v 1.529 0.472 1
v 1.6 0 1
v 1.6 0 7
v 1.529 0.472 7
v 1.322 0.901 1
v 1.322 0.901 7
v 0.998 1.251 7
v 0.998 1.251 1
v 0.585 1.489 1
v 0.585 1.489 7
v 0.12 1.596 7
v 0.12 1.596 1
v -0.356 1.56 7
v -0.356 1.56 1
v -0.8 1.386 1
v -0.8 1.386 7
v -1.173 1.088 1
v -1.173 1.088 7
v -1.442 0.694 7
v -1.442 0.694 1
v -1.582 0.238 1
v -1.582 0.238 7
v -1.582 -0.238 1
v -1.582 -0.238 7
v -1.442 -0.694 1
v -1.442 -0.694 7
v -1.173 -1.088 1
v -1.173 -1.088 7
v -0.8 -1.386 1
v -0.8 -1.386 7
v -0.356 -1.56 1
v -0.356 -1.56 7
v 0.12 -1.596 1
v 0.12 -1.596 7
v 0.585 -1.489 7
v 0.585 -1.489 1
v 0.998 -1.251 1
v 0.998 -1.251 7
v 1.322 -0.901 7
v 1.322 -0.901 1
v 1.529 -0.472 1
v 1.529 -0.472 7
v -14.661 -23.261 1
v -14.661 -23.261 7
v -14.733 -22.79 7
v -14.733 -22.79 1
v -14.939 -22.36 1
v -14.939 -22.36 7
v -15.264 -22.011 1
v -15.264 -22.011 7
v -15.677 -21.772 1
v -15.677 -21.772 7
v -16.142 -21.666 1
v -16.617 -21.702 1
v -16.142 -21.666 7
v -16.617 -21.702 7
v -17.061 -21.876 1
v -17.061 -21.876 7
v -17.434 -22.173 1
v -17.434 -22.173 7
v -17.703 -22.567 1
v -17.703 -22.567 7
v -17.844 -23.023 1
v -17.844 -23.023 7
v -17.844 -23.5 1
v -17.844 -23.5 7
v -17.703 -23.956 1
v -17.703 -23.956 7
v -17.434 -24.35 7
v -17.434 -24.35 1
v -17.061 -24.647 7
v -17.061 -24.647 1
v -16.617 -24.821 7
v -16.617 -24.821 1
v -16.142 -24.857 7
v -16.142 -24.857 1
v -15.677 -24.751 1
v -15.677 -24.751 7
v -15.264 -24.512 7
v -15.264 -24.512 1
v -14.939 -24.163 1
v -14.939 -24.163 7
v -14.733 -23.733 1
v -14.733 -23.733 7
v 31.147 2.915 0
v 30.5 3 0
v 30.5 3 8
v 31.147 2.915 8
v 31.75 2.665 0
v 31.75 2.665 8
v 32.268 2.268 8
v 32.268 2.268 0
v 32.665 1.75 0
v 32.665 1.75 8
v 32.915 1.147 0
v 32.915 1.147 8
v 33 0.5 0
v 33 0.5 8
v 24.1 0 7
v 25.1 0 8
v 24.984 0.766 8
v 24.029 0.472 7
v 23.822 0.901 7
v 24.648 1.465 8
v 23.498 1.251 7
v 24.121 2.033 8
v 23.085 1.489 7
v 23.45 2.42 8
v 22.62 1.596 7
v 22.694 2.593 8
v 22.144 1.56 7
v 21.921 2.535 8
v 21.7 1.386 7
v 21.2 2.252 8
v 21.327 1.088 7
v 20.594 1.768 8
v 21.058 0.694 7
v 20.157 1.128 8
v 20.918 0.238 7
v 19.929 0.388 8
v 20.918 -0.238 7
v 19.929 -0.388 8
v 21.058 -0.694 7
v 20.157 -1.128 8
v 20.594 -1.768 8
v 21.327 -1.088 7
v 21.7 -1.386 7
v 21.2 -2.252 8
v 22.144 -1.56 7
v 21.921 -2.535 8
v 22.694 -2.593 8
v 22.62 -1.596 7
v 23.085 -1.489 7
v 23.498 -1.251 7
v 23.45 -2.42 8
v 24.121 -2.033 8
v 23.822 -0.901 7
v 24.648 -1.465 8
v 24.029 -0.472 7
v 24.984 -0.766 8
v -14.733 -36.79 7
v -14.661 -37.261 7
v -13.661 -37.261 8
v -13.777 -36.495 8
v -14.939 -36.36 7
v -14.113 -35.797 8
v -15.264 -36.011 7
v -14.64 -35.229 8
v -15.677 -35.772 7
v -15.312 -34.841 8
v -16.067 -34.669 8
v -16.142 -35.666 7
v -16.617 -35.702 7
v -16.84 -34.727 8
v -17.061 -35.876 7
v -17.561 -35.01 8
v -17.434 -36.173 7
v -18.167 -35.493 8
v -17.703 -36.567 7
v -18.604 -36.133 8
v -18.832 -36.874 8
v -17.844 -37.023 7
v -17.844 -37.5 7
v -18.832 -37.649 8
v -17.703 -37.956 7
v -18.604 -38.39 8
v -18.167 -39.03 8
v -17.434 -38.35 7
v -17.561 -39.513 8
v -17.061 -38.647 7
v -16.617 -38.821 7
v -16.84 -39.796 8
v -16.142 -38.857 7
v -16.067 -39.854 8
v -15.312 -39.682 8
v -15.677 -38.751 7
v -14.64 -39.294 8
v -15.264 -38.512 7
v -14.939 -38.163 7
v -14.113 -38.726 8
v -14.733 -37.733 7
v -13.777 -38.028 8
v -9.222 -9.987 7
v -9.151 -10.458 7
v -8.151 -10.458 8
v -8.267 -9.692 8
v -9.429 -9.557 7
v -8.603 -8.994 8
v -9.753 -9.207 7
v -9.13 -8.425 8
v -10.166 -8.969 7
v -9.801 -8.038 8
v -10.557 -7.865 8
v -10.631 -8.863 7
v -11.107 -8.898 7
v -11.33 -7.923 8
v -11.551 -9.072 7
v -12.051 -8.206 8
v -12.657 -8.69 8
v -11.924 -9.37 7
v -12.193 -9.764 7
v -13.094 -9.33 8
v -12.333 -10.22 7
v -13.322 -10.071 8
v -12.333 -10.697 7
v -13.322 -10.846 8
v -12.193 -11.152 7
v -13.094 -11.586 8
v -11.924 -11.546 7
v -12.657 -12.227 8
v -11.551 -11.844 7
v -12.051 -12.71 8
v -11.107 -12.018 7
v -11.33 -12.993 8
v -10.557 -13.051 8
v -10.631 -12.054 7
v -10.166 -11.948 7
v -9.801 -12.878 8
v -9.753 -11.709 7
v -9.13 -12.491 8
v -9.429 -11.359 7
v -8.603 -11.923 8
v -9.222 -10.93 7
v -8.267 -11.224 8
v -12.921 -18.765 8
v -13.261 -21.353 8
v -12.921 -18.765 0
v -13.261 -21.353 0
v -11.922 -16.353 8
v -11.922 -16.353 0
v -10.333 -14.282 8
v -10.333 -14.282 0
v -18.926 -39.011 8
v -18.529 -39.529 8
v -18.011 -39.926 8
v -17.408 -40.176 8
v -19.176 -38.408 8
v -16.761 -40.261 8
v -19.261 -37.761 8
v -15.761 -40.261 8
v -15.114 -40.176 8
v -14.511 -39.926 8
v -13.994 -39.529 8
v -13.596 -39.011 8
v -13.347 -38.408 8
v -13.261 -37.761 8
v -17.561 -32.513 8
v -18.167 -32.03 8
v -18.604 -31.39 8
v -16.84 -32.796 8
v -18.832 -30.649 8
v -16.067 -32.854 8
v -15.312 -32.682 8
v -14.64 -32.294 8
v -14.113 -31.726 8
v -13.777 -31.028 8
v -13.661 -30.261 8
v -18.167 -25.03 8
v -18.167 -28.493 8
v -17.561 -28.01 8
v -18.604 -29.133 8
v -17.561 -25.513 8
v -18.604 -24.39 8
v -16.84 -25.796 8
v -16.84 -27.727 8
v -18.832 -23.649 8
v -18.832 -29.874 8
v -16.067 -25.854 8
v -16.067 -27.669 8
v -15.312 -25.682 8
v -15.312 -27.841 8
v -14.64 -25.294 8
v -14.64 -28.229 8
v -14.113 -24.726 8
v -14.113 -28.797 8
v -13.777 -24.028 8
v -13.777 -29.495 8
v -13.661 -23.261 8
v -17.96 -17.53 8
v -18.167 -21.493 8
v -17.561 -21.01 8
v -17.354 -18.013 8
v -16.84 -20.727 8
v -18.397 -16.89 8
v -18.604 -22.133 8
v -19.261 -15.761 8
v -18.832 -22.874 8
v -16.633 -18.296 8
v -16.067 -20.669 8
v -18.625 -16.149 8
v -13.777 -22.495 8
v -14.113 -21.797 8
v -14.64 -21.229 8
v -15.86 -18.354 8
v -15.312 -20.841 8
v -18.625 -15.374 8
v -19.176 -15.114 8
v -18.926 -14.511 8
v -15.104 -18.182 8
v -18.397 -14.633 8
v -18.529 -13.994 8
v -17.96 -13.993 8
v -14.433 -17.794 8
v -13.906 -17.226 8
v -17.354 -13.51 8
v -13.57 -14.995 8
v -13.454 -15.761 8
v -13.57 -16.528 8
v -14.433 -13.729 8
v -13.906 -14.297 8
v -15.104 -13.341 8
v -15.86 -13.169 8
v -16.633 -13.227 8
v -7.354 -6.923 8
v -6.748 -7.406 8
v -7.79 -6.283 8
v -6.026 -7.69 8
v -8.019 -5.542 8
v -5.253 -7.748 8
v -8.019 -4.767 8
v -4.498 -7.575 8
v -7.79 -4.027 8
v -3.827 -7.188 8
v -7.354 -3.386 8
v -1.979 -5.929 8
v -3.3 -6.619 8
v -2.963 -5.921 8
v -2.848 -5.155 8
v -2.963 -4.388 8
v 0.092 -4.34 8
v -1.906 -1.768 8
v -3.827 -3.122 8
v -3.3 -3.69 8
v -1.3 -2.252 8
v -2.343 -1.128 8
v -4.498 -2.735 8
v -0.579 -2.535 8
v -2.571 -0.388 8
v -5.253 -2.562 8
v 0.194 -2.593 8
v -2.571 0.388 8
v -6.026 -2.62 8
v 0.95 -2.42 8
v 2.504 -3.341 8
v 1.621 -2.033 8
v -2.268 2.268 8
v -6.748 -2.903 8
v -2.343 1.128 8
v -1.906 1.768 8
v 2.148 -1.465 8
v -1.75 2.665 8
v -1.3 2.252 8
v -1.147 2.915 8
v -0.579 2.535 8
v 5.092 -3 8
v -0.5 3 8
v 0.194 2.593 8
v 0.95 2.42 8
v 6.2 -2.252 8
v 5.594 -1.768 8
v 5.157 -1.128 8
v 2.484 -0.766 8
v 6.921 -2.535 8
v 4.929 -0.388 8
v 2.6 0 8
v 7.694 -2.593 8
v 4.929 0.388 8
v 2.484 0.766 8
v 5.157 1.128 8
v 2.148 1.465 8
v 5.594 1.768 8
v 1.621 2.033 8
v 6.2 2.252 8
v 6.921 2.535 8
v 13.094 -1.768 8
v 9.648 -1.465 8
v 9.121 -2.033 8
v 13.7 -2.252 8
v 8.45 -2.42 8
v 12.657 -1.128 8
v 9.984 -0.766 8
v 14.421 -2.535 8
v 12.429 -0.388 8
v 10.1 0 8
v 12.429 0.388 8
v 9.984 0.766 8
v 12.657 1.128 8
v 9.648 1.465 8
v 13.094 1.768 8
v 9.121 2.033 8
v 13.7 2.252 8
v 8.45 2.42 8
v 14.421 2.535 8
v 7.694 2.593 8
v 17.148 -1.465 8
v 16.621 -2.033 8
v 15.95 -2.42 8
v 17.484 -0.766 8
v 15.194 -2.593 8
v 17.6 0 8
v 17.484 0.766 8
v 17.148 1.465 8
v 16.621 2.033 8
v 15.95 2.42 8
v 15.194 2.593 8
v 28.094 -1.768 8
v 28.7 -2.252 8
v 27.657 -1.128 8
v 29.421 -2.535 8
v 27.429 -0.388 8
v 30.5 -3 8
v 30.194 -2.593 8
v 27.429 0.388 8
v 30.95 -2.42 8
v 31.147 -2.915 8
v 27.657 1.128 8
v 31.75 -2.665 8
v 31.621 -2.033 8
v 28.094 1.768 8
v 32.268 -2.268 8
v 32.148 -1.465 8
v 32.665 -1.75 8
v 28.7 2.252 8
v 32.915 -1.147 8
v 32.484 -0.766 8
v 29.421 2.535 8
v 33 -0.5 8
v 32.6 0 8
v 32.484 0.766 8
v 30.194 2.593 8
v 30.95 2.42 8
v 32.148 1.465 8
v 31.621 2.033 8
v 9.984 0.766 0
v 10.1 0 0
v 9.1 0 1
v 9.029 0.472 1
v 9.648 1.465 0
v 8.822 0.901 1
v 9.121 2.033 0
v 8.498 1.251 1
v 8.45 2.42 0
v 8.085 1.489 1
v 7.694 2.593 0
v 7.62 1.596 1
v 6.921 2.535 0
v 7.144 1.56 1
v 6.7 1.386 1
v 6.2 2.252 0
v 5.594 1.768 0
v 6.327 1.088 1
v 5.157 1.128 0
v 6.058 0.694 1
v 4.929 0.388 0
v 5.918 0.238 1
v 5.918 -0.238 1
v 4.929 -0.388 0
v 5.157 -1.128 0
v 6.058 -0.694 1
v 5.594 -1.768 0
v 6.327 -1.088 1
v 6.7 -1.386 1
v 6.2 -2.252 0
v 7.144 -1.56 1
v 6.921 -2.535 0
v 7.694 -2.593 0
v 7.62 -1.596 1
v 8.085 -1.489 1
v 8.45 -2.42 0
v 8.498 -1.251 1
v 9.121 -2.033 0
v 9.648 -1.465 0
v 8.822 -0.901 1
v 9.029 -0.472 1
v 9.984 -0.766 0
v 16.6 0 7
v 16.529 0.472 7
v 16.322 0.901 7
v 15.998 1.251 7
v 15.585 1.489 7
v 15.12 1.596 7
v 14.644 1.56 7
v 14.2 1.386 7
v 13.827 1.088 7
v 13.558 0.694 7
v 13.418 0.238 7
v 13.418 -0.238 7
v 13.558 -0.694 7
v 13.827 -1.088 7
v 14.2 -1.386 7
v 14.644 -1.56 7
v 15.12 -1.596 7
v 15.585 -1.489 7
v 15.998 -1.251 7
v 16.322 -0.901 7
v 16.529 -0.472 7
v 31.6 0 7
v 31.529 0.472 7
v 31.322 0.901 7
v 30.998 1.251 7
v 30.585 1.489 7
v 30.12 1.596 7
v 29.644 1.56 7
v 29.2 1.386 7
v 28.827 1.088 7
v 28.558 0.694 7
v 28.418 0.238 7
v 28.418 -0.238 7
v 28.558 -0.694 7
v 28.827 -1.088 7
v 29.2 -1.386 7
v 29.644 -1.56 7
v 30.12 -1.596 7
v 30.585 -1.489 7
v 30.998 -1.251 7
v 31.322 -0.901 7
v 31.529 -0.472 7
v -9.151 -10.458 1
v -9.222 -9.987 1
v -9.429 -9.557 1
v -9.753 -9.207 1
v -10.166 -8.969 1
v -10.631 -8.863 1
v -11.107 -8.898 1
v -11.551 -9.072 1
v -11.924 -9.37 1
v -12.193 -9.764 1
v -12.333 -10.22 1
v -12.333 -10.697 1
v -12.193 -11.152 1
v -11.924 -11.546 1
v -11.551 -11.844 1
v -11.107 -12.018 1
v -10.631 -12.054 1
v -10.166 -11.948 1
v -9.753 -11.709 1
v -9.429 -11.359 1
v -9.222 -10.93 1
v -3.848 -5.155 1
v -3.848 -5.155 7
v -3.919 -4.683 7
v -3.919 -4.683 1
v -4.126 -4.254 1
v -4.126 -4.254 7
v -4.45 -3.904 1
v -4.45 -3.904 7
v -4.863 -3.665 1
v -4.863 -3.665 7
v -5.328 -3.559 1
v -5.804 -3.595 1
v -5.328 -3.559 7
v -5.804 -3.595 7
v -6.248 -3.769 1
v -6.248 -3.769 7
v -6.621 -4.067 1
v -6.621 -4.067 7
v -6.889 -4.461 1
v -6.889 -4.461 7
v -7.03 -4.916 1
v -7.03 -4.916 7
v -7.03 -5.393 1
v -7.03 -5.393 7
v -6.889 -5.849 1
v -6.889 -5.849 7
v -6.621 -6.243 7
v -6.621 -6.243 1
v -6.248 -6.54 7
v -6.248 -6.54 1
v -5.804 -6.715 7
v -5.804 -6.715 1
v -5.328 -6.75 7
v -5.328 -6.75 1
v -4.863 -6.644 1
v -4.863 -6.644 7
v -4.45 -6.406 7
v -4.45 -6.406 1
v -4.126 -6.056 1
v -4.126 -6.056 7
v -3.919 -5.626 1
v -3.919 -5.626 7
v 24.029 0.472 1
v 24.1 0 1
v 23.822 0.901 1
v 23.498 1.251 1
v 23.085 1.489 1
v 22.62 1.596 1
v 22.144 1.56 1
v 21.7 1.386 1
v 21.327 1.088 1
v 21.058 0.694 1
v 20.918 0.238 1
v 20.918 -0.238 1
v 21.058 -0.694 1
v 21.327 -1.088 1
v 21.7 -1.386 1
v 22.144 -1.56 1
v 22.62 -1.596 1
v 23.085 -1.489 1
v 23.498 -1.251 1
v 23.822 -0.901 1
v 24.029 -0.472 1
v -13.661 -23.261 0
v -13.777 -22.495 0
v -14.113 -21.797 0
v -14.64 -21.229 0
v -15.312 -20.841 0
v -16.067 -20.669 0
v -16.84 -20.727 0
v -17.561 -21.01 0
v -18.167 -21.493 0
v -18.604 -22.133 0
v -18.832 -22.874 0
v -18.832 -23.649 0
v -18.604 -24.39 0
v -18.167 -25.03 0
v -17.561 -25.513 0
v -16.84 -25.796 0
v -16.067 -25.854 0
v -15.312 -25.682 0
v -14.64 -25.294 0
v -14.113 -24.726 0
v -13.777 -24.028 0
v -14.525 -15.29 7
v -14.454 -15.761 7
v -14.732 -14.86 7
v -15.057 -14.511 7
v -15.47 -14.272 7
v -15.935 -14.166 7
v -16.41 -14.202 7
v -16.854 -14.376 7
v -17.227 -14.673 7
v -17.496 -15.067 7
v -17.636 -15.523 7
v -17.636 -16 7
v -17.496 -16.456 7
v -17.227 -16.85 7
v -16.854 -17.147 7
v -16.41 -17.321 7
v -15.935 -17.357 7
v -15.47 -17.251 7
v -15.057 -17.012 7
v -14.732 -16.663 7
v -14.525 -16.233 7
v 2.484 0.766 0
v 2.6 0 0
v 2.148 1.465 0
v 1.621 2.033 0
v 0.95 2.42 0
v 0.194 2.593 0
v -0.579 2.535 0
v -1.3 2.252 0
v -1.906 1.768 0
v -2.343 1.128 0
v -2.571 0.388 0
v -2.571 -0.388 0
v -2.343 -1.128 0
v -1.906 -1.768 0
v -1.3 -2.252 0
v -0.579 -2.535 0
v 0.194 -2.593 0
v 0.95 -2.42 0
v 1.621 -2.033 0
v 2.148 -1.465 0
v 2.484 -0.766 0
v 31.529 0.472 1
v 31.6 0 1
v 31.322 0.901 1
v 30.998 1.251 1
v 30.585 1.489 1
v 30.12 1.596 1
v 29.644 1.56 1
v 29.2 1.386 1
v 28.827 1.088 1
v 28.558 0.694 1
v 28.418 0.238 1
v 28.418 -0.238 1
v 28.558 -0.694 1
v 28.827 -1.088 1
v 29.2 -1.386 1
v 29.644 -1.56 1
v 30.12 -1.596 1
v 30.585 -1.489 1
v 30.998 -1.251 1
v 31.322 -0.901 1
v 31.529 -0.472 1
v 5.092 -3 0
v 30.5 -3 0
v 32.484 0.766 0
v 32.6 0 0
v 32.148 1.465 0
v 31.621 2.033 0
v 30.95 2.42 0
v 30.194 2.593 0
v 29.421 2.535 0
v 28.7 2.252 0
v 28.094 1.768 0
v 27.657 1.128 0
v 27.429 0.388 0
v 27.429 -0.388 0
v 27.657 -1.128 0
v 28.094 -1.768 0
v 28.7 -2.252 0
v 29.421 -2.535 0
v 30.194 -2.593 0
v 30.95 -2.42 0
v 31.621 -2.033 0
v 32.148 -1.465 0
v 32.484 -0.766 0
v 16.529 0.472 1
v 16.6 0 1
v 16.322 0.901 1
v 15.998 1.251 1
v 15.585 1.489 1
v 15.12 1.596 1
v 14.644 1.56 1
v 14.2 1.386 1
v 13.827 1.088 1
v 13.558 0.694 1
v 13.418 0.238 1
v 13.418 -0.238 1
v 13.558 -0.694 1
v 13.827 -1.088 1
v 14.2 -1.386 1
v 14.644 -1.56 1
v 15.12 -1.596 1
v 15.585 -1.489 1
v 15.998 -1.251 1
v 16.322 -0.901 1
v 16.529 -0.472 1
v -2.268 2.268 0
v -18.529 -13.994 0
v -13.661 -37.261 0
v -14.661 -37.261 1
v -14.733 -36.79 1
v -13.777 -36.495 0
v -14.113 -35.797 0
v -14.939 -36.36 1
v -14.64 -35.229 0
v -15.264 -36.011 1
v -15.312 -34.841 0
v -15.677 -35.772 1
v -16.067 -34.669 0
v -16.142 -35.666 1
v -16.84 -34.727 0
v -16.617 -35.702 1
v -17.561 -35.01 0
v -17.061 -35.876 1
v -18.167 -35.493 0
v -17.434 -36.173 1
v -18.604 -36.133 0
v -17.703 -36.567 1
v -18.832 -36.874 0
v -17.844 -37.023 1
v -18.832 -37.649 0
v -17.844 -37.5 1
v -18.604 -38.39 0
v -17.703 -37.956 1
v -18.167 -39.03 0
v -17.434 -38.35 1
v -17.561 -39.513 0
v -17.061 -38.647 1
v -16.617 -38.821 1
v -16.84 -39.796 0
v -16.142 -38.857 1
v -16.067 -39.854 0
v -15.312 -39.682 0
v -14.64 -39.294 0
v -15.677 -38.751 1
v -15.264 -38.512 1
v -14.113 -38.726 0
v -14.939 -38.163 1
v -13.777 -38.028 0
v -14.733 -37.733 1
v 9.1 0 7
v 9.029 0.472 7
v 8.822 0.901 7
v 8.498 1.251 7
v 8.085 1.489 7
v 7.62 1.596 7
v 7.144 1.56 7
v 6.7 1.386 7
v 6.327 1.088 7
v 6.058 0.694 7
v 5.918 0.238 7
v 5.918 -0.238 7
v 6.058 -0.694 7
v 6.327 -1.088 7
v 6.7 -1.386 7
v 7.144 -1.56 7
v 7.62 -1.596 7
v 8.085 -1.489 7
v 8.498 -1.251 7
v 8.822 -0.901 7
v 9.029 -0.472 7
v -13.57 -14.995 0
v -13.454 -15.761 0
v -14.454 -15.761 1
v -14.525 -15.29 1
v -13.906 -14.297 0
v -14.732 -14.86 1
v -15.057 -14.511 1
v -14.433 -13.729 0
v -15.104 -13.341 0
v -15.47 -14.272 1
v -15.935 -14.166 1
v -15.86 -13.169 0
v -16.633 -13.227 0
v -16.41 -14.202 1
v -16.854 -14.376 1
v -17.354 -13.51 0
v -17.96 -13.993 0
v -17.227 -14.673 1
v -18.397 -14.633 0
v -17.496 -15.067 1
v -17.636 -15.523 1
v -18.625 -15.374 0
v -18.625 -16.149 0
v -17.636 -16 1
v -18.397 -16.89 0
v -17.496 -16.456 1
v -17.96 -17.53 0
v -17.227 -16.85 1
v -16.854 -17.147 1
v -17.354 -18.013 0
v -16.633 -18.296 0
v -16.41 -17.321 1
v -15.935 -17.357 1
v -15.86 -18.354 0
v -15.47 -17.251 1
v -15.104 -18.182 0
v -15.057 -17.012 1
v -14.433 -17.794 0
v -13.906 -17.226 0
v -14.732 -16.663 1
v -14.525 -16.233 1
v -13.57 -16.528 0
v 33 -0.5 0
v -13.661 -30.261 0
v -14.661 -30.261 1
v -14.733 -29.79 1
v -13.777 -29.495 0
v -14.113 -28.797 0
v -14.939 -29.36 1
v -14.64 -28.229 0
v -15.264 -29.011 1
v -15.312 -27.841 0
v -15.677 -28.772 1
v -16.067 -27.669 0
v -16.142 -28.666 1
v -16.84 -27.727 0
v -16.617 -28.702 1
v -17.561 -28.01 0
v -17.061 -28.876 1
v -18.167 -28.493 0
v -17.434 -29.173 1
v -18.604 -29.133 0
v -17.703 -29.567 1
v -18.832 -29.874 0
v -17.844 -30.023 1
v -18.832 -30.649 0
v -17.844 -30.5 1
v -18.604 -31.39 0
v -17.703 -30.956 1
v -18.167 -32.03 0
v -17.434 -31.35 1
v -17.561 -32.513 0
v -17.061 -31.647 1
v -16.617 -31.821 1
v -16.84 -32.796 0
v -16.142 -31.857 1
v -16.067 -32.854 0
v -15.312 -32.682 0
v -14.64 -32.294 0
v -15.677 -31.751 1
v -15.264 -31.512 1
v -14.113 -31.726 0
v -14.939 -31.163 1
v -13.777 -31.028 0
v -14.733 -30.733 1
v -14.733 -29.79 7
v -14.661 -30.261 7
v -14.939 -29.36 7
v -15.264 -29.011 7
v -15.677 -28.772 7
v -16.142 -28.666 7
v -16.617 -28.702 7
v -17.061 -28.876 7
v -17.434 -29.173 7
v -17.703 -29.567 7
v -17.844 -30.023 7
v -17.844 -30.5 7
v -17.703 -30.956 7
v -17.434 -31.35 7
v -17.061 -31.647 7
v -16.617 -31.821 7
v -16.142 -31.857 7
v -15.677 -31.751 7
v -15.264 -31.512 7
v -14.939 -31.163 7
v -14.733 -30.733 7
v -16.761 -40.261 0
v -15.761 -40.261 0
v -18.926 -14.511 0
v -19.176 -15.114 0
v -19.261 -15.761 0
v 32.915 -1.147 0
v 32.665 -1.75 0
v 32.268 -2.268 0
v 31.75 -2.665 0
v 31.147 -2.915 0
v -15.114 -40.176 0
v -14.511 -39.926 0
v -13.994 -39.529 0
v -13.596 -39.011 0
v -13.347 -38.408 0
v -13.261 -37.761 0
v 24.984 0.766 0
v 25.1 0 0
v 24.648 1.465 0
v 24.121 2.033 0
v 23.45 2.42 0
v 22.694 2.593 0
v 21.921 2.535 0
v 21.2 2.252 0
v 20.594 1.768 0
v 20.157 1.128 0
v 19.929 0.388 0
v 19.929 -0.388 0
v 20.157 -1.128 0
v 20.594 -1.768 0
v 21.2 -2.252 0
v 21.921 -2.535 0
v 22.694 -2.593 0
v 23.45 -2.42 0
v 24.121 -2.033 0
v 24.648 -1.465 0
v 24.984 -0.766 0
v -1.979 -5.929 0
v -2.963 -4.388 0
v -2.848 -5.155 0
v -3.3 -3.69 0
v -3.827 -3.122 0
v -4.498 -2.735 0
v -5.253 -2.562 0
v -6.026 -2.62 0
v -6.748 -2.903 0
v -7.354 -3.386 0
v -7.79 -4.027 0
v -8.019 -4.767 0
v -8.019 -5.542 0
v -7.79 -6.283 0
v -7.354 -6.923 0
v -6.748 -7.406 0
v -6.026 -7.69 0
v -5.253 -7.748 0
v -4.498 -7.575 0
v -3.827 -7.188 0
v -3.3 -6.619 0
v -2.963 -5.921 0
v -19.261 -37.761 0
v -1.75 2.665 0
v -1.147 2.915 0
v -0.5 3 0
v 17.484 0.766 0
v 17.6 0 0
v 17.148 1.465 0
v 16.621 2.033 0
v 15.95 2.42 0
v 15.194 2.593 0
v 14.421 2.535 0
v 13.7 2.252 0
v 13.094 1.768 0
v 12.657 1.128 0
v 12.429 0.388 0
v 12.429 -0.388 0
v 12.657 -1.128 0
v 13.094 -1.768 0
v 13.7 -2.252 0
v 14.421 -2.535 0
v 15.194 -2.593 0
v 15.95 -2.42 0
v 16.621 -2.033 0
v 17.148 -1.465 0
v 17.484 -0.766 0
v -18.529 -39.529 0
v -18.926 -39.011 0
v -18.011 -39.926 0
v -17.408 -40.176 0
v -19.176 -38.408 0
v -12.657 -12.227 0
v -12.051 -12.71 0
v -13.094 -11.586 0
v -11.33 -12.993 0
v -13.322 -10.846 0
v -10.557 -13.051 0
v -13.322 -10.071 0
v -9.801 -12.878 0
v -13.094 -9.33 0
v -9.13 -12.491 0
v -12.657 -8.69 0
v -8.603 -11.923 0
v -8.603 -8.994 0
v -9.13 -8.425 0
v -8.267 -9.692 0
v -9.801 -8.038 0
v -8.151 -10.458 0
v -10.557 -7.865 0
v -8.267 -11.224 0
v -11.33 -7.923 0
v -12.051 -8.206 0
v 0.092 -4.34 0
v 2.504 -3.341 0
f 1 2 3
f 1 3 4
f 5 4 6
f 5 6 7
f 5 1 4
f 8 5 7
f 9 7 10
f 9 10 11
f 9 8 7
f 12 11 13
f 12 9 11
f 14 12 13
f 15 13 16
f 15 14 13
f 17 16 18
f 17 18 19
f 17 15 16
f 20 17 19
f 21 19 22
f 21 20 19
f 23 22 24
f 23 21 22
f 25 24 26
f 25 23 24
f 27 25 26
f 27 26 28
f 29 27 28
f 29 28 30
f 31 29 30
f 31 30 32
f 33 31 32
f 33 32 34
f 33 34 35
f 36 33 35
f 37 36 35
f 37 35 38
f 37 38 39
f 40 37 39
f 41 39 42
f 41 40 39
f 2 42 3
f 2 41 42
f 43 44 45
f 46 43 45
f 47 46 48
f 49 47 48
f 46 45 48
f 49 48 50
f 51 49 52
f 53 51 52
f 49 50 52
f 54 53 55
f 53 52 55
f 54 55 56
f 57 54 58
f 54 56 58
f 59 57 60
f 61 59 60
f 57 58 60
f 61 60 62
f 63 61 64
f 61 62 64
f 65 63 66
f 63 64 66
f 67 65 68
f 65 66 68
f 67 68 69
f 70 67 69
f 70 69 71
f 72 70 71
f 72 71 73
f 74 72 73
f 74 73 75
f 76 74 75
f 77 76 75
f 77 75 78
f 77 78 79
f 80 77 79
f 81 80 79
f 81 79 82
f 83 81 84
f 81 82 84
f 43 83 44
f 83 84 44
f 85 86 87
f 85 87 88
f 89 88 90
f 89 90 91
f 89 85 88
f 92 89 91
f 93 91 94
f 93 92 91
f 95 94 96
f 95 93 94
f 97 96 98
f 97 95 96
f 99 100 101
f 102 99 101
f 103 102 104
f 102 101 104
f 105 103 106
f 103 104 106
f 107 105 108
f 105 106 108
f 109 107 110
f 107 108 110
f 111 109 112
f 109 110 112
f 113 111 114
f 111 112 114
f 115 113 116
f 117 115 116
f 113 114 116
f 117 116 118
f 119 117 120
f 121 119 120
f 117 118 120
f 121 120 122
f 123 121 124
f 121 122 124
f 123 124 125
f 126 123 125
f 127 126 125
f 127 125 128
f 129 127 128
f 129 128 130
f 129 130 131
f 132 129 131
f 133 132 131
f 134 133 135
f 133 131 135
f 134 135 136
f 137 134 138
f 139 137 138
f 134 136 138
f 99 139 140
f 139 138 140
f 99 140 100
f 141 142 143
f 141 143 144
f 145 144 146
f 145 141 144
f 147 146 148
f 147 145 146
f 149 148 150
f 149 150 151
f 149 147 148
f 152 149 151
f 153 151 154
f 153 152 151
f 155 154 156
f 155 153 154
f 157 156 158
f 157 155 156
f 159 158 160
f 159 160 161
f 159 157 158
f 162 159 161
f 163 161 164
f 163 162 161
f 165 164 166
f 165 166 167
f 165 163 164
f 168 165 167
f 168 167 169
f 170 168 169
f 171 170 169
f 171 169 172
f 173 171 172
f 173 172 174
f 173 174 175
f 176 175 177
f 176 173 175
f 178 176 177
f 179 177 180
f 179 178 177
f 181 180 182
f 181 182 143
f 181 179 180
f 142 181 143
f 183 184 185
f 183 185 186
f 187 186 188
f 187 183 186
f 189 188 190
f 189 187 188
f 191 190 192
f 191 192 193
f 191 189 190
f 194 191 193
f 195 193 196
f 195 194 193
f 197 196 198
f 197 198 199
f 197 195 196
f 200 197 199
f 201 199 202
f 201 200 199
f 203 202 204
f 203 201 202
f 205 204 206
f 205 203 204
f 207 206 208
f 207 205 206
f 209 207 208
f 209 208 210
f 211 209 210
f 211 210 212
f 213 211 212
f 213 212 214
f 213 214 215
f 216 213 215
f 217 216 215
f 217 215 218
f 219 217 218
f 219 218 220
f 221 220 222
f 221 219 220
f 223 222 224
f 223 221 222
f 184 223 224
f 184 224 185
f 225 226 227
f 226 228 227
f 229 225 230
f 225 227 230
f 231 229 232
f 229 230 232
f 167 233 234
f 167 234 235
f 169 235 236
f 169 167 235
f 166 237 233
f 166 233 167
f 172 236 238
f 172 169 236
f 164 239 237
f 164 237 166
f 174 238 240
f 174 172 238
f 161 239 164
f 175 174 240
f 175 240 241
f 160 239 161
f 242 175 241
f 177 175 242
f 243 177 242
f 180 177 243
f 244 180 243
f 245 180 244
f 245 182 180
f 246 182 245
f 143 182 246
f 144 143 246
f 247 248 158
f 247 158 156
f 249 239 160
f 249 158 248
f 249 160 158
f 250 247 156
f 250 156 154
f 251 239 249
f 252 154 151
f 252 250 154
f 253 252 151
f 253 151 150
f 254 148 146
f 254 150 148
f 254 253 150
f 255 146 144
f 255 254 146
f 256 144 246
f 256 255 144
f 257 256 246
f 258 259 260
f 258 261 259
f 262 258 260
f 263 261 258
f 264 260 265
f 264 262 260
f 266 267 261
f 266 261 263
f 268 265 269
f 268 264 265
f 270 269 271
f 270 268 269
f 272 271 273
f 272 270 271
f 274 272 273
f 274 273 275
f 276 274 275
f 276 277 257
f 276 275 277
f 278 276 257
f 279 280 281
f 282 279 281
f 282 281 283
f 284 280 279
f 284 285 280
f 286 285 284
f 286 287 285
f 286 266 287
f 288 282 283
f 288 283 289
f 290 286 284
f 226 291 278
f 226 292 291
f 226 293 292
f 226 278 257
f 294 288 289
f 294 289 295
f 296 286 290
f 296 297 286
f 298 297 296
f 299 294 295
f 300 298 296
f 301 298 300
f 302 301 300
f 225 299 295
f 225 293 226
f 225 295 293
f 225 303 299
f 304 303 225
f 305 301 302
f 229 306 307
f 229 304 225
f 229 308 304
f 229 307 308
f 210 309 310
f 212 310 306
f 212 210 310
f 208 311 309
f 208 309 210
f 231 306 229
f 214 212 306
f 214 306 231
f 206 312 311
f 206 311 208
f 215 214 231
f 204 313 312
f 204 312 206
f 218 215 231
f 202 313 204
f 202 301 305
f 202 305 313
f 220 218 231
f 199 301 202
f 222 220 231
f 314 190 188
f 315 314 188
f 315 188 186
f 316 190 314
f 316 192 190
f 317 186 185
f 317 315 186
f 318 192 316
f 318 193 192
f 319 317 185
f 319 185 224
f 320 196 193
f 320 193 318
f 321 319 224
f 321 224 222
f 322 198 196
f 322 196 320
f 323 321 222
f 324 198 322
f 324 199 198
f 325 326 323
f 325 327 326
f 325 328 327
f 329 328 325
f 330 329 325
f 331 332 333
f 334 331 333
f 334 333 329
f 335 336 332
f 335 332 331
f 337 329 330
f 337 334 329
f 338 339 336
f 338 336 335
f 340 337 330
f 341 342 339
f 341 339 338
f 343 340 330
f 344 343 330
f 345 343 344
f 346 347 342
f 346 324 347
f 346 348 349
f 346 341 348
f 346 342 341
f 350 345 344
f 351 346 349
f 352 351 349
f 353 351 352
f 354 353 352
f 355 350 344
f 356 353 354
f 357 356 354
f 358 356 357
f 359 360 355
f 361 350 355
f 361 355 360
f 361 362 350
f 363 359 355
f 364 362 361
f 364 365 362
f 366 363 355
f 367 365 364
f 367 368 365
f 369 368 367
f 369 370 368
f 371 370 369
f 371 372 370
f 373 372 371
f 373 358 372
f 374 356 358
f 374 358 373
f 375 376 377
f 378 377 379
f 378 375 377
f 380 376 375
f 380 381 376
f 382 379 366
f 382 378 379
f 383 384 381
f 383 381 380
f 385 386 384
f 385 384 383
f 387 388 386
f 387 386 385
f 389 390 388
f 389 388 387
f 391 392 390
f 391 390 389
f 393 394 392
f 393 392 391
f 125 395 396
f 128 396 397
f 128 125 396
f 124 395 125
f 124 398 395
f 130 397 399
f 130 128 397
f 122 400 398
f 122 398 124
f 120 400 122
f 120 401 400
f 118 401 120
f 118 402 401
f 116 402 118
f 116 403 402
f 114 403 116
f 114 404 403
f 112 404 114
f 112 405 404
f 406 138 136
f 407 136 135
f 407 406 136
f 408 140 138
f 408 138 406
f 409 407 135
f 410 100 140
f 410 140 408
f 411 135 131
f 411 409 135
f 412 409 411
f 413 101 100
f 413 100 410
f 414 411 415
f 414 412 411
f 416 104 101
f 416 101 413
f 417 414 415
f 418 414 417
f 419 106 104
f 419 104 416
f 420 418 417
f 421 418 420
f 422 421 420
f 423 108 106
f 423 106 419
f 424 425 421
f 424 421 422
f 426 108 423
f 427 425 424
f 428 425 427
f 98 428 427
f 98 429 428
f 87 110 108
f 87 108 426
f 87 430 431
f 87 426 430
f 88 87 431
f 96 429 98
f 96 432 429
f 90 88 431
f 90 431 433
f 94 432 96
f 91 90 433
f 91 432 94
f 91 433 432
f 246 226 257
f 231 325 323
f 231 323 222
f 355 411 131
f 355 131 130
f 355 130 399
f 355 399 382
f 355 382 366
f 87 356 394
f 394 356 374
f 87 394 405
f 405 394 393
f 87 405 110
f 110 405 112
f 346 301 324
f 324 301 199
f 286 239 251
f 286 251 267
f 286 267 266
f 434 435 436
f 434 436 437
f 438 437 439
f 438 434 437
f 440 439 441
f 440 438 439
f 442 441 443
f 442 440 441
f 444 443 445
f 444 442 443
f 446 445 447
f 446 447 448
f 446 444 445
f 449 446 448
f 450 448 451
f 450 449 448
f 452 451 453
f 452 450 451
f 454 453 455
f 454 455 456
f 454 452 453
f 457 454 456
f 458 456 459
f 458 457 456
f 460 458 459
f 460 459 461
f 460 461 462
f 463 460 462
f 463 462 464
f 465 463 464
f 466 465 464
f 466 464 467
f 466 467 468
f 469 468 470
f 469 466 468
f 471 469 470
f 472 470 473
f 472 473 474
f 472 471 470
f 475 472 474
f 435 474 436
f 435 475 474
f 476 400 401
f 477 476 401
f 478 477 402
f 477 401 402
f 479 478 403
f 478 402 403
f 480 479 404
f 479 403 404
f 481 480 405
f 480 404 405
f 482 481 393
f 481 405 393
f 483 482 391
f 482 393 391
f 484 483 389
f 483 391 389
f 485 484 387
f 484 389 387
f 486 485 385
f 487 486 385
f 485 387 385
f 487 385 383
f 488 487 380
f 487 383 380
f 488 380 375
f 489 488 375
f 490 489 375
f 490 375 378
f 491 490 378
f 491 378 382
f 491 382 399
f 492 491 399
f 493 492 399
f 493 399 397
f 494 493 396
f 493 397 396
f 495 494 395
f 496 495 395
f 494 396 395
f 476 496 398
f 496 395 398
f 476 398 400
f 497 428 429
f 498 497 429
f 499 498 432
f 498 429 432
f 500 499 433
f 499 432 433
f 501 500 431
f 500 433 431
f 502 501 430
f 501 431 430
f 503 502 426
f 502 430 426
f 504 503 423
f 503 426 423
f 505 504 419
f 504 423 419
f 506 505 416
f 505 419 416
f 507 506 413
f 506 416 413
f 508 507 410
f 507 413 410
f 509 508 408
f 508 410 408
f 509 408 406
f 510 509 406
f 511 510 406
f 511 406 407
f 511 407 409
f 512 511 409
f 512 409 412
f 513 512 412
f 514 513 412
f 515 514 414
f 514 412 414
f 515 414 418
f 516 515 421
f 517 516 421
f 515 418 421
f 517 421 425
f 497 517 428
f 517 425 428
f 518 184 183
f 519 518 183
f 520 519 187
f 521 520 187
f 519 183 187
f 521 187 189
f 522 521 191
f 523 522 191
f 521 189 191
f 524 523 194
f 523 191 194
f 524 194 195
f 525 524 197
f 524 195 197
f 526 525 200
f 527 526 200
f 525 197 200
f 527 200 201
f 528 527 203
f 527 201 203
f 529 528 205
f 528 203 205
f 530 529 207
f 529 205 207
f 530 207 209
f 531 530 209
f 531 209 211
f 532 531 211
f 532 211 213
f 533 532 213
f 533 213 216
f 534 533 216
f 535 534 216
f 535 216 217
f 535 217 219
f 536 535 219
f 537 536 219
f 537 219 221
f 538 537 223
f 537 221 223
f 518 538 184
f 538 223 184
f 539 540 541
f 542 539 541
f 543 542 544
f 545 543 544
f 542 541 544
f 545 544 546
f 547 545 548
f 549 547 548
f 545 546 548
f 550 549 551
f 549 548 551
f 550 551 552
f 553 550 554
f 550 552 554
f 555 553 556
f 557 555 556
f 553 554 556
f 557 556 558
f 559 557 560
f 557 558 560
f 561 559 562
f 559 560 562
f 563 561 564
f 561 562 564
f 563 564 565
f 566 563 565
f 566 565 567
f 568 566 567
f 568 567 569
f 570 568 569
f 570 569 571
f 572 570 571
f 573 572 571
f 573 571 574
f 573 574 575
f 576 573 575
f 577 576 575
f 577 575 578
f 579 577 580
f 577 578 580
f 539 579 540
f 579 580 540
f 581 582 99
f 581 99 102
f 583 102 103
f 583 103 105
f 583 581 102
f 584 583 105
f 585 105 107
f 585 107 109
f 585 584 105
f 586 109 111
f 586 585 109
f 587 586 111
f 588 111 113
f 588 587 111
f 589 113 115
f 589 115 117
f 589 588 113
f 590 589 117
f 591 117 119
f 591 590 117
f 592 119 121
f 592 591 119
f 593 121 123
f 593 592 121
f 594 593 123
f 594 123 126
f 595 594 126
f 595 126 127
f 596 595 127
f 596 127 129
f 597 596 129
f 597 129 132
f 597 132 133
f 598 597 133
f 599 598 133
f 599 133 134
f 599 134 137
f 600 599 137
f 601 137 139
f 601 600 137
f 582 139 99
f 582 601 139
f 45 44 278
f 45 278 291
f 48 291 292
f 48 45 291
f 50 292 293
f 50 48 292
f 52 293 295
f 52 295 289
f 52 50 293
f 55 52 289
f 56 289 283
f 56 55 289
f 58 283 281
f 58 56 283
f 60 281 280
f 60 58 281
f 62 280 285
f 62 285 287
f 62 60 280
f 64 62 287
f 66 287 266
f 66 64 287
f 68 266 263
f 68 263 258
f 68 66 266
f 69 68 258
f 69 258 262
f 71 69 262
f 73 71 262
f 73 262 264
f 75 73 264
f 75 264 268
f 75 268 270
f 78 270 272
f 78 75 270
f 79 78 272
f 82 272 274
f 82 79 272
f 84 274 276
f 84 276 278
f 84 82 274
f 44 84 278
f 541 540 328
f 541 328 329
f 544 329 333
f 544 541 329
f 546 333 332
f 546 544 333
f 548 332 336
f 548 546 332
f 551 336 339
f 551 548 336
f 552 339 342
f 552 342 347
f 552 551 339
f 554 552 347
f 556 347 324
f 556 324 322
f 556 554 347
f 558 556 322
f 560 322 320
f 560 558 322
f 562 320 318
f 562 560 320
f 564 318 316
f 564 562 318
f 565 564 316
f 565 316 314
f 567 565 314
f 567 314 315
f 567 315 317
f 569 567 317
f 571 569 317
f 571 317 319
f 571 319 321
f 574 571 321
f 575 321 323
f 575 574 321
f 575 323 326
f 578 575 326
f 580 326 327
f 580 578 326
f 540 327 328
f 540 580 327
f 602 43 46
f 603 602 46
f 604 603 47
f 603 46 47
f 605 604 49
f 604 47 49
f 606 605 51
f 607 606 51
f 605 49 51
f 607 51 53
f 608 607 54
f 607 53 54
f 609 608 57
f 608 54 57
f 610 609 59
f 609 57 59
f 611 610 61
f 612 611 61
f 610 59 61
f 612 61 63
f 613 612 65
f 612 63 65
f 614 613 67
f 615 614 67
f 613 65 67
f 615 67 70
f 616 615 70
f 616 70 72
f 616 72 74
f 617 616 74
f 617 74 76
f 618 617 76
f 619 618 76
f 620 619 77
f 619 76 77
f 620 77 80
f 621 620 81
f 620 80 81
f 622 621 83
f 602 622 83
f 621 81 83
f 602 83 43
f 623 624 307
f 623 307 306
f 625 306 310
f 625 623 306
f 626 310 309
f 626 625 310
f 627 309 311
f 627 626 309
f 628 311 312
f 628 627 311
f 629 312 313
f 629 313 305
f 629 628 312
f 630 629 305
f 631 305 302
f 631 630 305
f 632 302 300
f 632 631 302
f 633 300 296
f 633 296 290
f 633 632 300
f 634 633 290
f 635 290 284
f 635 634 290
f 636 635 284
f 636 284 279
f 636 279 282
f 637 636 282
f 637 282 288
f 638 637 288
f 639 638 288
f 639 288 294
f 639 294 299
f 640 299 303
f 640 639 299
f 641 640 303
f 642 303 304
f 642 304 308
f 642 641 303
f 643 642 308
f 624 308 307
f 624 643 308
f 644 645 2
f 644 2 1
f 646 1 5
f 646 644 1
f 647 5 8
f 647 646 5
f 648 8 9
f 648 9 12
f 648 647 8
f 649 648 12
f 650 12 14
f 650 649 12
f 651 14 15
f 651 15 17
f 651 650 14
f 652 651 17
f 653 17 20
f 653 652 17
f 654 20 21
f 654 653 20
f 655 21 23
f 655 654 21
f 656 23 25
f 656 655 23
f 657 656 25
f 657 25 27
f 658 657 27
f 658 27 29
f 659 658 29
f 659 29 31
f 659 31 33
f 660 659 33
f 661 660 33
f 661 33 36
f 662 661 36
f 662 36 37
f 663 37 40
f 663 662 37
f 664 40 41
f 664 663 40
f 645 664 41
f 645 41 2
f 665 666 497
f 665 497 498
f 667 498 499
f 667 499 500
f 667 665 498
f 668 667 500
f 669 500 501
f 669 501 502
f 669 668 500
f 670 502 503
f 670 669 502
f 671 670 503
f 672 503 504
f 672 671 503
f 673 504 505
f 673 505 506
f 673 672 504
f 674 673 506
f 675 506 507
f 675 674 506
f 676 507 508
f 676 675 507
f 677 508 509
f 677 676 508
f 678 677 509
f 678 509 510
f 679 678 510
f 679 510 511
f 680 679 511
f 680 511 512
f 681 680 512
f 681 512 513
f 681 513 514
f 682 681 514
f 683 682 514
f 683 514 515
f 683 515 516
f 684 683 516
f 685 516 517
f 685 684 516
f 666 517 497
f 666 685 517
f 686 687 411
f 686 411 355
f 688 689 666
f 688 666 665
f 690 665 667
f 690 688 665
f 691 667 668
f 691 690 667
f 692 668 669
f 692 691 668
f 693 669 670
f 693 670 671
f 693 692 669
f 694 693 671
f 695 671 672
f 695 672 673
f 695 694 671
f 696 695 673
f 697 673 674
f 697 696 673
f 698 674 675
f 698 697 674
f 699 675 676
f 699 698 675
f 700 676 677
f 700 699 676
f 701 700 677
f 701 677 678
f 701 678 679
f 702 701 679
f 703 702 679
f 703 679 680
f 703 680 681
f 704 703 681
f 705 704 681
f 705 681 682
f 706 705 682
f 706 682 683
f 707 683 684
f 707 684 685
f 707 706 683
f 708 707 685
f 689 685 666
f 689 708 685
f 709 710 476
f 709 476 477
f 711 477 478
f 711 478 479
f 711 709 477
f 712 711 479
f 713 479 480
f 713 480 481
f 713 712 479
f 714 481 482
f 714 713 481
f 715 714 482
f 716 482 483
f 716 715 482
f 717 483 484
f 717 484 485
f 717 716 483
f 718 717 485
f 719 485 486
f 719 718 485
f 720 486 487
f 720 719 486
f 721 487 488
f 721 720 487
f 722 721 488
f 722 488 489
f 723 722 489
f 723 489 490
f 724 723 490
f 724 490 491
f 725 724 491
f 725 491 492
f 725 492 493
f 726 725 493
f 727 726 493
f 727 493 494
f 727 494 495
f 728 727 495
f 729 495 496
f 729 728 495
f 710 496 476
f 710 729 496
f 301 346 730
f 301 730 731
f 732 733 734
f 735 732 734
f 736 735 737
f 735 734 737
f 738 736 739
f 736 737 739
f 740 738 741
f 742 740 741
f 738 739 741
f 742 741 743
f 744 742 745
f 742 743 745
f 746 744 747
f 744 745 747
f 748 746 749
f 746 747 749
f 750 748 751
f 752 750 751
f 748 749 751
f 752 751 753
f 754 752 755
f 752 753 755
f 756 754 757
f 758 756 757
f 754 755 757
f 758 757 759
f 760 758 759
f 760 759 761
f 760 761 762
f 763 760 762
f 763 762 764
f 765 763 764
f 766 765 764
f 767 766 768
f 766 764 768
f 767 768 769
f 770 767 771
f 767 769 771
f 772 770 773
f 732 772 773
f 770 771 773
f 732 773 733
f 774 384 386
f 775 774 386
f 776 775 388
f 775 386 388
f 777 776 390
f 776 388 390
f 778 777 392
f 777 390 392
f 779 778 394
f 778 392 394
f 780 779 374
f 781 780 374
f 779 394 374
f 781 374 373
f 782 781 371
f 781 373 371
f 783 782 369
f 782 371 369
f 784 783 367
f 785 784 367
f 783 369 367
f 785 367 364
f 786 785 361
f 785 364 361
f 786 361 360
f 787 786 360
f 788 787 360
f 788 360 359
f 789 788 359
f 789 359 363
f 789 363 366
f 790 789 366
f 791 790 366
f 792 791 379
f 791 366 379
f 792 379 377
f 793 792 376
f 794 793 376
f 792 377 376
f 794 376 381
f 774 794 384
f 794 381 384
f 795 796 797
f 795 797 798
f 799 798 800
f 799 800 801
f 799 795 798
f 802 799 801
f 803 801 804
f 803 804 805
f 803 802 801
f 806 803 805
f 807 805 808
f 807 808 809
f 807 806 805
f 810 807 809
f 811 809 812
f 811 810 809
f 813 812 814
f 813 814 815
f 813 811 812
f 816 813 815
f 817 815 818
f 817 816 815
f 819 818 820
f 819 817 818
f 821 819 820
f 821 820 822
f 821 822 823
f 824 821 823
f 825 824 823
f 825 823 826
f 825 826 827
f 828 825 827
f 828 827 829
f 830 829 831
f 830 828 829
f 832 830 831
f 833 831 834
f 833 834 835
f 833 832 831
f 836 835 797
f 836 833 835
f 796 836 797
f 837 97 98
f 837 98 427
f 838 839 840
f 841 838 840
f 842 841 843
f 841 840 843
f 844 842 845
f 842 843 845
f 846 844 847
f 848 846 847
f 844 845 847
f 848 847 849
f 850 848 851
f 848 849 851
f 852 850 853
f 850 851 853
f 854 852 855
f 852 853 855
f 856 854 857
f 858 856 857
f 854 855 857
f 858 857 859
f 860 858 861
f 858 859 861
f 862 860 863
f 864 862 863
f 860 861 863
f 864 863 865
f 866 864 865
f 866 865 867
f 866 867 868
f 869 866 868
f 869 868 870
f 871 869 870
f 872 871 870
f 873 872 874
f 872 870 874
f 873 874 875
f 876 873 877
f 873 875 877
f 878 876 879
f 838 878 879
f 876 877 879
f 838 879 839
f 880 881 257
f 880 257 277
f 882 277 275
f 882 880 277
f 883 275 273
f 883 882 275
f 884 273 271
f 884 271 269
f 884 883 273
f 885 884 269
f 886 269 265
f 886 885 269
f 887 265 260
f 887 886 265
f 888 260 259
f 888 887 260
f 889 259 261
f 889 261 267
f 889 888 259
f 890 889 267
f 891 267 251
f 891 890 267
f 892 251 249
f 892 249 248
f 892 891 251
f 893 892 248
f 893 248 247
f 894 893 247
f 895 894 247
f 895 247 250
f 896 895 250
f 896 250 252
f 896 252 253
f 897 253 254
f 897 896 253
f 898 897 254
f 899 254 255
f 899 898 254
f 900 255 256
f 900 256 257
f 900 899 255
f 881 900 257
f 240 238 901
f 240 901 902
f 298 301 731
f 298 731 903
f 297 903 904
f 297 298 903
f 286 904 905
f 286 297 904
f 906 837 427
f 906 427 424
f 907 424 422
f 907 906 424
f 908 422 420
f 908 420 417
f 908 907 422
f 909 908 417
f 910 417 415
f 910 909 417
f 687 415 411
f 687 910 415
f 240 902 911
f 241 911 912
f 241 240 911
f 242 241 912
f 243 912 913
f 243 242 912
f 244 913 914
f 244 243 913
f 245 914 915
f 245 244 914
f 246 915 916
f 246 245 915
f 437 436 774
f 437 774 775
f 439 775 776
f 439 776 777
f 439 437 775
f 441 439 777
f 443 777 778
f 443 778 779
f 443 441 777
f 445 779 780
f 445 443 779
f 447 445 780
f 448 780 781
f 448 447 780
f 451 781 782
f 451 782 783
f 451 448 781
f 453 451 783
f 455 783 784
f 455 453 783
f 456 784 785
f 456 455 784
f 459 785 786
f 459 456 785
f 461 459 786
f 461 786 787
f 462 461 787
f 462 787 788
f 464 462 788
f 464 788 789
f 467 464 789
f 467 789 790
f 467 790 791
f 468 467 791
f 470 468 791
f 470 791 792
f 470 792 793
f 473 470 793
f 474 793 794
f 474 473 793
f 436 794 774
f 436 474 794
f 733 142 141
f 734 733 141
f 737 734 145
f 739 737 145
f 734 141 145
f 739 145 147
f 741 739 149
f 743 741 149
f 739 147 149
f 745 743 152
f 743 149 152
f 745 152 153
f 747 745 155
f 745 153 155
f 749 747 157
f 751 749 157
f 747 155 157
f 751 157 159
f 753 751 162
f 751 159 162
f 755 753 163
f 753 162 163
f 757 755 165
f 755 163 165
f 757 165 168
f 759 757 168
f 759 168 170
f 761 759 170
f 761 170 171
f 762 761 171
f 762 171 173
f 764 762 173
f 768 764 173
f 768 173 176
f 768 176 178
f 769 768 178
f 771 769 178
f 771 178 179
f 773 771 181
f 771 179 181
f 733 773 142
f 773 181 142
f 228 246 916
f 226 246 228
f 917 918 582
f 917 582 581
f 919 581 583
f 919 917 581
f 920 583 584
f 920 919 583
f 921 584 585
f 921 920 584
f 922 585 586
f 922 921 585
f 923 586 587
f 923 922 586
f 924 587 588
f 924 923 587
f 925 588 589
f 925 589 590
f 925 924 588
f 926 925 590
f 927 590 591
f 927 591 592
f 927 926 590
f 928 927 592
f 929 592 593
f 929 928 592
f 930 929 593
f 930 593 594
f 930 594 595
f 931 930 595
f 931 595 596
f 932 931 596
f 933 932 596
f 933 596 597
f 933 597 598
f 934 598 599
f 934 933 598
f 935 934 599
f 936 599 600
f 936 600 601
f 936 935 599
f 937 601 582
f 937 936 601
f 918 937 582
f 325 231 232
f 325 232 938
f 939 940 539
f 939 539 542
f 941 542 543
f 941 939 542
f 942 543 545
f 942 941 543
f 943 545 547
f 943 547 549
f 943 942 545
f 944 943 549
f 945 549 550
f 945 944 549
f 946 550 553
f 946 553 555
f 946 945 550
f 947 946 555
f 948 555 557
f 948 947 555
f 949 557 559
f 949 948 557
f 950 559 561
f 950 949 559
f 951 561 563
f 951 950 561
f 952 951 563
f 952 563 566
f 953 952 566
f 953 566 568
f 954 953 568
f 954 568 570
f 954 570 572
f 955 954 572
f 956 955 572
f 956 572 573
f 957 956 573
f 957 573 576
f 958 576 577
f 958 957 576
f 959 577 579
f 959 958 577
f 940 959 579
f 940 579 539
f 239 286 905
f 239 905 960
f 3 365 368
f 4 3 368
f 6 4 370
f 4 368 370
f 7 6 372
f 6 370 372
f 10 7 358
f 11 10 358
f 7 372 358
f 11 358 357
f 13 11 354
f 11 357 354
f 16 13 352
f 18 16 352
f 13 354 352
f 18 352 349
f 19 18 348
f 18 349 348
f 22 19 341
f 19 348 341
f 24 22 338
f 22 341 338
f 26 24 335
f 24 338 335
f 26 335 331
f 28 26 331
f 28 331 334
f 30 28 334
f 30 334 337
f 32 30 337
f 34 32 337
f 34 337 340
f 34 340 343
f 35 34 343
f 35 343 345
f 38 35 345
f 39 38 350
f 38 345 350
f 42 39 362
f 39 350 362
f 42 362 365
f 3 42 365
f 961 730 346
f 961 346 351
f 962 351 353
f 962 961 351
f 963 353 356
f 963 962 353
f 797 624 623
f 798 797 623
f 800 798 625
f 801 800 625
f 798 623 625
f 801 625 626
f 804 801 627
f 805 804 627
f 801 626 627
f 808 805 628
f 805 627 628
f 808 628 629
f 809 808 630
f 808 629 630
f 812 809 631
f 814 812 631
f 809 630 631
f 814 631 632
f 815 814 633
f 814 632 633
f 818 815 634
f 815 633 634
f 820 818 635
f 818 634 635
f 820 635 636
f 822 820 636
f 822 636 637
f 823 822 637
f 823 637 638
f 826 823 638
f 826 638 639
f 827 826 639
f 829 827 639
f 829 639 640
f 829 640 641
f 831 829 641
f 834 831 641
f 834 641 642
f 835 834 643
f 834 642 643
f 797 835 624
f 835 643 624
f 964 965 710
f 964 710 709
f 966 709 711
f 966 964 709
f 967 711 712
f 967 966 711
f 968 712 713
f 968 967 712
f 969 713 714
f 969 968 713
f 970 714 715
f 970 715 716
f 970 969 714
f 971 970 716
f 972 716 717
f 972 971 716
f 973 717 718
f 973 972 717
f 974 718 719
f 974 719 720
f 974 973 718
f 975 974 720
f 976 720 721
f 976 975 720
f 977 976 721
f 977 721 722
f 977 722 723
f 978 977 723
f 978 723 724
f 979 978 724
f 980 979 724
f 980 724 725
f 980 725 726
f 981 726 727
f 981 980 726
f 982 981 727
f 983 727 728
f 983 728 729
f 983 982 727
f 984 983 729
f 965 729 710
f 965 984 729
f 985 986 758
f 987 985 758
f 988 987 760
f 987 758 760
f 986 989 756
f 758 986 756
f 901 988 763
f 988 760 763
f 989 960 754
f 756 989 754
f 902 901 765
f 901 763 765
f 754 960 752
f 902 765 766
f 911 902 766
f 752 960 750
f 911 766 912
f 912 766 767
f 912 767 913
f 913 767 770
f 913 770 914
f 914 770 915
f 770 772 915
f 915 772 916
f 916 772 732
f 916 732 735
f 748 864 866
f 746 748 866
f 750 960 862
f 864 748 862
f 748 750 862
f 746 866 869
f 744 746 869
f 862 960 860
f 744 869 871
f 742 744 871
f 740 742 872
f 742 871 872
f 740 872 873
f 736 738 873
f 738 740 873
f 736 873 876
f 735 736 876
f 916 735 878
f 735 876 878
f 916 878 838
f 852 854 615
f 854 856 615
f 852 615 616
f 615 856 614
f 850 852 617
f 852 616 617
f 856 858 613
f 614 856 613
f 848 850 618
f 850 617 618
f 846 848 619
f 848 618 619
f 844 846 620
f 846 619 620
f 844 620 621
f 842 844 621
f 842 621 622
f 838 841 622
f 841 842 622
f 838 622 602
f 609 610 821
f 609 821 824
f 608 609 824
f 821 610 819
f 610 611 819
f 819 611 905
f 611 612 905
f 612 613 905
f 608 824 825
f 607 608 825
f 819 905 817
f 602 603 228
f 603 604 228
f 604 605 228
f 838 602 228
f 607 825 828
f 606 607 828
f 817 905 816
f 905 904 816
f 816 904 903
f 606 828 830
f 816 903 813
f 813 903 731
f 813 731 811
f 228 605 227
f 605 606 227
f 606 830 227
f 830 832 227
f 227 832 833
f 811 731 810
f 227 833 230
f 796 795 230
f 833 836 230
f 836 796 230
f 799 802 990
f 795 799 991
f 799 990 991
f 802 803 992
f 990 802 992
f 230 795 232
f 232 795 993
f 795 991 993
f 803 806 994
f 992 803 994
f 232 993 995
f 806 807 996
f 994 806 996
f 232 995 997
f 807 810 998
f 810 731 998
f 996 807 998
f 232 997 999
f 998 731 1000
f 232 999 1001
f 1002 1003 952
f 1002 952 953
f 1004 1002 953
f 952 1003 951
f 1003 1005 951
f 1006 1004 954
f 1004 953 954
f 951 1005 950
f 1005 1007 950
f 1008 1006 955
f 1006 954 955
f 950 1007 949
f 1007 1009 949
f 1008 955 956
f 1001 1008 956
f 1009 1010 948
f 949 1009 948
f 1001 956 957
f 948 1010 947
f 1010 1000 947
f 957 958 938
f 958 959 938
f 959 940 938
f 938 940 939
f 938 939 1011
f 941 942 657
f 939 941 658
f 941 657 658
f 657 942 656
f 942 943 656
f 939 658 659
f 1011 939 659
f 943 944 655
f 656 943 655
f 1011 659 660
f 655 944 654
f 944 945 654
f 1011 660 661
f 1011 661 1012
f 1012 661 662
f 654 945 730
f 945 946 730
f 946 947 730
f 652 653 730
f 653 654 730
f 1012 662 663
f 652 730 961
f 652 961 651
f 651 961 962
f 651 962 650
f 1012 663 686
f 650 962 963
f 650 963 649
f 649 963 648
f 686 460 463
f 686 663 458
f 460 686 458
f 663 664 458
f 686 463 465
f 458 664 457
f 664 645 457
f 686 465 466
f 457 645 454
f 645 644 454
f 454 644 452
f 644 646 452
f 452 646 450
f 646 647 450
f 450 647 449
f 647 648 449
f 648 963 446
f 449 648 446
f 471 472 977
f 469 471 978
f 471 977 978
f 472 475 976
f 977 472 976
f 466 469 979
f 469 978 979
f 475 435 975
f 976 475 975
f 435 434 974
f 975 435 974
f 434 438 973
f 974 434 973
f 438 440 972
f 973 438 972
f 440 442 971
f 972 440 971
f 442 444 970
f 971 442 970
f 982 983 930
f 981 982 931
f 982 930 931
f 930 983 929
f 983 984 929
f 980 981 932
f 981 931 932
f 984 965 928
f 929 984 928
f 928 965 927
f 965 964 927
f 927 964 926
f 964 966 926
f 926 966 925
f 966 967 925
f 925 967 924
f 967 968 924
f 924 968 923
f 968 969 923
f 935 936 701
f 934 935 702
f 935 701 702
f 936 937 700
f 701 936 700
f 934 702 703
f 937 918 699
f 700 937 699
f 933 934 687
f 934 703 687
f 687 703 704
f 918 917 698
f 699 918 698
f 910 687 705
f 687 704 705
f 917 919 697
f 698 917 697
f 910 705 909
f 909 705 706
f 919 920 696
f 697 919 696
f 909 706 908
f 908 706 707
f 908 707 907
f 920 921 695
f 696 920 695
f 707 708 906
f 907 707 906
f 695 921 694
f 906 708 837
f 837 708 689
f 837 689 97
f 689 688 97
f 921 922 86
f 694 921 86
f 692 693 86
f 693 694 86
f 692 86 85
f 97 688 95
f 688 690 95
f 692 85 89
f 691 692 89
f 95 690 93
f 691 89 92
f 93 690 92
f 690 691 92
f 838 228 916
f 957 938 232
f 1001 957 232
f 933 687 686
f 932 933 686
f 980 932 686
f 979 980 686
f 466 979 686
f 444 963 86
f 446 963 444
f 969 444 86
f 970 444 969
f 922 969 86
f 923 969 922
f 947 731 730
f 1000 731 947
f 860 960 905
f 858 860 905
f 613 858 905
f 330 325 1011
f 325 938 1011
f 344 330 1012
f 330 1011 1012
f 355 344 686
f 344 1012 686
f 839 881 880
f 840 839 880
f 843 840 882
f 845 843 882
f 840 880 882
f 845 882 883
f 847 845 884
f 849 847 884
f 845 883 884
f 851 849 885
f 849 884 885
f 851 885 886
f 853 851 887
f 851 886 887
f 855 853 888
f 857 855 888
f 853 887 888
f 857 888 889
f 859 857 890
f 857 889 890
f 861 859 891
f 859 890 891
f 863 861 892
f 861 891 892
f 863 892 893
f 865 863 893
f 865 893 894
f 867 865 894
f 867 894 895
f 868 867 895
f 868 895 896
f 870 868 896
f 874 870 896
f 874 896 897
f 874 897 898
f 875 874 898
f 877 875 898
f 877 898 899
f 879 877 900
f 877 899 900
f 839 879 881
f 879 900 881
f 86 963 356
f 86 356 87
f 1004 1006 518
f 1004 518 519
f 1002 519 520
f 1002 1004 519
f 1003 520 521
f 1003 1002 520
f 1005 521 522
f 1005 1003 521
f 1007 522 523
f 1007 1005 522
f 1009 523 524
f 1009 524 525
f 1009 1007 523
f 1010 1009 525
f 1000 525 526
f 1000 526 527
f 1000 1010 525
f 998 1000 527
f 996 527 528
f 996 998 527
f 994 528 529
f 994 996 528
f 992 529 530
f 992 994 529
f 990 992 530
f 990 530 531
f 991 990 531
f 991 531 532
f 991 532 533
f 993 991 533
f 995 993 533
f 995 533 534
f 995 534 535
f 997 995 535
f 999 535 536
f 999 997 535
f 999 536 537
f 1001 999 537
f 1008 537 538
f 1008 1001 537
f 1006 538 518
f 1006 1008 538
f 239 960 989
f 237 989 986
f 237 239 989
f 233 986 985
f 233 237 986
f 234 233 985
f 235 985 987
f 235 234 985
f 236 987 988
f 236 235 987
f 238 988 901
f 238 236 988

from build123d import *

# Parameters (mm, degrees)
SKETCH1_R           = 1.6
BOSS_EXTRUDE1_DEPTH = 8
CHAMFER1_SIZE       = 1
SKETCH2_R           = 1.6
BOSS_EXTRUDE3_DEPTH = 8
FILLET1_R           = 10
CHAMFER2_SIZE       = 1
SKETCH3_R           = 1.6
BOSS_EXTRUDE4_DEPTH = 8
CHAMFER5_SIZE       = 1
FILLET2_R           = 10


with BuildPart() as part:
    # Sketch1 → Boss-Extrude1 (new body)
    with BuildSketch(Plane.XY):
        with BuildLine():
            Line((-0.5, 3), (30.5, 3))
            ThreePointArc((30.5, 3), (32.267766953, 2.267766953), (33, 0.5))
            Line((33, 0.5), (33, -0.5))
            ThreePointArc((33, -0.5), (32.267766953, -2.267766953), (30.5, -3))
            Line((30.5, -3), (-0.5, -3))
            ThreePointArc((-0.5, -3), (-2.267766953, -2.267766953), (-3, -0.5))
            Line((-3, -0.5), (-3, 0.5))
            ThreePointArc((-3, 0.5), (-2.267766953, 2.267766953), (-0.5, 3))
        make_face()
        Circle(SKETCH1_R, mode=Mode.SUBTRACT)
        with Locations((7.5, 0)):
            Circle(SKETCH1_R, mode=Mode.SUBTRACT)
        with Locations((15, 0)):
            Circle(SKETCH1_R, mode=Mode.SUBTRACT)
        with Locations((22.5, 0)):
            Circle(SKETCH1_R, mode=Mode.SUBTRACT)
        with Locations((30, 0)):
            Circle(SKETCH1_R, mode=Mode.SUBTRACT)
    extrude(amount=BOSS_EXTRUDE1_DEPTH)

    # Chamfer1
    chamfer1_edges = [part.edges().sort_by_distance(p)[0] for p in [
        (-1.6, 0, 0),
        (-1.6, 0, 8),
        (5.9, 0, 0),
        (5.9, 0, 8),
        (13.4, 0, 0),
        (13.4, 0, 8),
        (20.9, 0, 0),
        (20.9, 0, 8),
        (28.4, 0, 0),
        (28.4, 0, 8),
    ]]
    chamfer(chamfer1_edges, length=CHAMFER1_SIZE)

    # Sketch2 → Boss-Extrude3 (add)
    with BuildSketch(Plane.XY.offset(8)):
        with BuildLine():
            ThreePointArc((-3, 0.5), (-2.809698831, 1.456708581), (-2.267766953, 2.267766953))
            Line((-2.267766953, 2.267766953), (-18.529200529, -13.993666623))
            ThreePointArc((-18.529200529, -13.993666623), (-19.261433576, -15.761433576), (-18.529200529, -17.529200529))
            Line((-18.529200529, -17.529200529), (-17.822093748, -18.23630731))
            ThreePointArc((-17.822093748, -18.23630731), (-16.054326795, -18.968540357), (-14.286559842, -18.23630731))
            Line((-14.286559842, -18.23630731), (0.949747468, -3))
            Line((0.949747468, -3), (-0.5, -3))
            ThreePointArc((-0.5, -3), (-2.267766953, -2.267766953), (-3, -0.5))
            Line((-3, -0.5), (-3, 0.5))
        make_face()
        with Locations((-16.054326795, -15.761433576)):
            Circle(SKETCH2_R, mode=Mode.SUBTRACT)
        with Locations((-10.751025936, -10.458132717)):
            Circle(SKETCH2_R, mode=Mode.SUBTRACT)
        with Locations((-5.447725077, -5.154831858)):
            Circle(SKETCH2_R, mode=Mode.SUBTRACT)
    extrude(amount=-BOSS_EXTRUDE3_DEPTH)

    # Fillet1
    fillet1_edges = [part.edges().sort_by_distance(p)[0] for p in [
        (0.949747468, -3, 4),
    ]]
    fillet(fillet1_edges, radius=FILLET1_R)

    # Chamfer2
    chamfer2_edges = [part.edges().sort_by_distance(p)[0] for p in [
        (-17.654326795, -15.761433576, 8),
        (-12.351025936, -10.458132717, 8),
        (-7.047725077, -5.154831858, 8),
        (-7.047725077, -5.154831858, 0),
        (-12.351025936, -10.458132717, 0),
        (-17.654326795, -15.761433576, 0),
    ]]
    chamfer(chamfer2_edges, length=CHAMFER2_SIZE)

    # Sketch3 → Boss-Extrude4 (add)
    with BuildSketch(Plane.XY.offset(8)):
        with BuildLine():
            ThreePointArc((-18.529200529, -17.529200529), (-19.071132407, -16.718142157), (-19.261433576, -15.761433576))
            Line((-19.261433576, -15.761433576), (-19.261433576, -37.761433576))
            ThreePointArc((-19.261433576, -37.761433576), (-18.529200529, -39.529200529), (-16.761433576, -40.261433576))
            Line((-16.761433576, -40.261433576), (-15.761433576, -40.261433576))
            ThreePointArc((-15.761433576, -40.261433576), (-13.993666623, -39.529200529), (-13.261433576, -37.761433576))
            Line((-13.261433576, -37.761433576), (-13.261433576, -17.211181044))
            Line((-13.261433576, -17.211181044), (-14.286559842, -18.23630731))
            ThreePointArc((-14.286559842, -18.23630731), (-16.054326795, -18.968540357), (-17.822093748, -18.23630731))
            Line((-17.822093748, -18.23630731), (-18.529200529, -17.529200529))
        make_face()
        with Locations((-16.261433576, -30.261433576)):
            Circle(SKETCH3_R, mode=Mode.SUBTRACT)
        with Locations((-16.261433576, -37.261433576)):
            Circle(SKETCH3_R, mode=Mode.SUBTRACT)
        with Locations((-16.261433576, -23.261433576)):
            Circle(SKETCH3_R, mode=Mode.SUBTRACT)
    extrude(amount=-BOSS_EXTRUDE4_DEPTH)

    # Chamfer5
    chamfer5_edges = [part.edges().sort_by_distance(p)[0] for p in [
        (-17.861433576, -37.261433576, 8),
        (-17.861433576, -30.261433576, 8),
        (-17.861433576, -23.261433576, 8),
        (-17.861433576, -23.261433576, 0),
        (-17.861433576, -30.261433576, 0),
        (-17.861433576, -37.261433576, 0),
    ]]
    chamfer(chamfer5_edges, length=CHAMFER5_SIZE)

    # Fillet2
    fillet2_edges = [part.edges().sort_by_distance(p)[0] for p in [
        (-13.261433576, -17.211181044, 4),
    ]]
    fillet(fillet2_edges, radius=FILLET2_R)


solid = part.part
